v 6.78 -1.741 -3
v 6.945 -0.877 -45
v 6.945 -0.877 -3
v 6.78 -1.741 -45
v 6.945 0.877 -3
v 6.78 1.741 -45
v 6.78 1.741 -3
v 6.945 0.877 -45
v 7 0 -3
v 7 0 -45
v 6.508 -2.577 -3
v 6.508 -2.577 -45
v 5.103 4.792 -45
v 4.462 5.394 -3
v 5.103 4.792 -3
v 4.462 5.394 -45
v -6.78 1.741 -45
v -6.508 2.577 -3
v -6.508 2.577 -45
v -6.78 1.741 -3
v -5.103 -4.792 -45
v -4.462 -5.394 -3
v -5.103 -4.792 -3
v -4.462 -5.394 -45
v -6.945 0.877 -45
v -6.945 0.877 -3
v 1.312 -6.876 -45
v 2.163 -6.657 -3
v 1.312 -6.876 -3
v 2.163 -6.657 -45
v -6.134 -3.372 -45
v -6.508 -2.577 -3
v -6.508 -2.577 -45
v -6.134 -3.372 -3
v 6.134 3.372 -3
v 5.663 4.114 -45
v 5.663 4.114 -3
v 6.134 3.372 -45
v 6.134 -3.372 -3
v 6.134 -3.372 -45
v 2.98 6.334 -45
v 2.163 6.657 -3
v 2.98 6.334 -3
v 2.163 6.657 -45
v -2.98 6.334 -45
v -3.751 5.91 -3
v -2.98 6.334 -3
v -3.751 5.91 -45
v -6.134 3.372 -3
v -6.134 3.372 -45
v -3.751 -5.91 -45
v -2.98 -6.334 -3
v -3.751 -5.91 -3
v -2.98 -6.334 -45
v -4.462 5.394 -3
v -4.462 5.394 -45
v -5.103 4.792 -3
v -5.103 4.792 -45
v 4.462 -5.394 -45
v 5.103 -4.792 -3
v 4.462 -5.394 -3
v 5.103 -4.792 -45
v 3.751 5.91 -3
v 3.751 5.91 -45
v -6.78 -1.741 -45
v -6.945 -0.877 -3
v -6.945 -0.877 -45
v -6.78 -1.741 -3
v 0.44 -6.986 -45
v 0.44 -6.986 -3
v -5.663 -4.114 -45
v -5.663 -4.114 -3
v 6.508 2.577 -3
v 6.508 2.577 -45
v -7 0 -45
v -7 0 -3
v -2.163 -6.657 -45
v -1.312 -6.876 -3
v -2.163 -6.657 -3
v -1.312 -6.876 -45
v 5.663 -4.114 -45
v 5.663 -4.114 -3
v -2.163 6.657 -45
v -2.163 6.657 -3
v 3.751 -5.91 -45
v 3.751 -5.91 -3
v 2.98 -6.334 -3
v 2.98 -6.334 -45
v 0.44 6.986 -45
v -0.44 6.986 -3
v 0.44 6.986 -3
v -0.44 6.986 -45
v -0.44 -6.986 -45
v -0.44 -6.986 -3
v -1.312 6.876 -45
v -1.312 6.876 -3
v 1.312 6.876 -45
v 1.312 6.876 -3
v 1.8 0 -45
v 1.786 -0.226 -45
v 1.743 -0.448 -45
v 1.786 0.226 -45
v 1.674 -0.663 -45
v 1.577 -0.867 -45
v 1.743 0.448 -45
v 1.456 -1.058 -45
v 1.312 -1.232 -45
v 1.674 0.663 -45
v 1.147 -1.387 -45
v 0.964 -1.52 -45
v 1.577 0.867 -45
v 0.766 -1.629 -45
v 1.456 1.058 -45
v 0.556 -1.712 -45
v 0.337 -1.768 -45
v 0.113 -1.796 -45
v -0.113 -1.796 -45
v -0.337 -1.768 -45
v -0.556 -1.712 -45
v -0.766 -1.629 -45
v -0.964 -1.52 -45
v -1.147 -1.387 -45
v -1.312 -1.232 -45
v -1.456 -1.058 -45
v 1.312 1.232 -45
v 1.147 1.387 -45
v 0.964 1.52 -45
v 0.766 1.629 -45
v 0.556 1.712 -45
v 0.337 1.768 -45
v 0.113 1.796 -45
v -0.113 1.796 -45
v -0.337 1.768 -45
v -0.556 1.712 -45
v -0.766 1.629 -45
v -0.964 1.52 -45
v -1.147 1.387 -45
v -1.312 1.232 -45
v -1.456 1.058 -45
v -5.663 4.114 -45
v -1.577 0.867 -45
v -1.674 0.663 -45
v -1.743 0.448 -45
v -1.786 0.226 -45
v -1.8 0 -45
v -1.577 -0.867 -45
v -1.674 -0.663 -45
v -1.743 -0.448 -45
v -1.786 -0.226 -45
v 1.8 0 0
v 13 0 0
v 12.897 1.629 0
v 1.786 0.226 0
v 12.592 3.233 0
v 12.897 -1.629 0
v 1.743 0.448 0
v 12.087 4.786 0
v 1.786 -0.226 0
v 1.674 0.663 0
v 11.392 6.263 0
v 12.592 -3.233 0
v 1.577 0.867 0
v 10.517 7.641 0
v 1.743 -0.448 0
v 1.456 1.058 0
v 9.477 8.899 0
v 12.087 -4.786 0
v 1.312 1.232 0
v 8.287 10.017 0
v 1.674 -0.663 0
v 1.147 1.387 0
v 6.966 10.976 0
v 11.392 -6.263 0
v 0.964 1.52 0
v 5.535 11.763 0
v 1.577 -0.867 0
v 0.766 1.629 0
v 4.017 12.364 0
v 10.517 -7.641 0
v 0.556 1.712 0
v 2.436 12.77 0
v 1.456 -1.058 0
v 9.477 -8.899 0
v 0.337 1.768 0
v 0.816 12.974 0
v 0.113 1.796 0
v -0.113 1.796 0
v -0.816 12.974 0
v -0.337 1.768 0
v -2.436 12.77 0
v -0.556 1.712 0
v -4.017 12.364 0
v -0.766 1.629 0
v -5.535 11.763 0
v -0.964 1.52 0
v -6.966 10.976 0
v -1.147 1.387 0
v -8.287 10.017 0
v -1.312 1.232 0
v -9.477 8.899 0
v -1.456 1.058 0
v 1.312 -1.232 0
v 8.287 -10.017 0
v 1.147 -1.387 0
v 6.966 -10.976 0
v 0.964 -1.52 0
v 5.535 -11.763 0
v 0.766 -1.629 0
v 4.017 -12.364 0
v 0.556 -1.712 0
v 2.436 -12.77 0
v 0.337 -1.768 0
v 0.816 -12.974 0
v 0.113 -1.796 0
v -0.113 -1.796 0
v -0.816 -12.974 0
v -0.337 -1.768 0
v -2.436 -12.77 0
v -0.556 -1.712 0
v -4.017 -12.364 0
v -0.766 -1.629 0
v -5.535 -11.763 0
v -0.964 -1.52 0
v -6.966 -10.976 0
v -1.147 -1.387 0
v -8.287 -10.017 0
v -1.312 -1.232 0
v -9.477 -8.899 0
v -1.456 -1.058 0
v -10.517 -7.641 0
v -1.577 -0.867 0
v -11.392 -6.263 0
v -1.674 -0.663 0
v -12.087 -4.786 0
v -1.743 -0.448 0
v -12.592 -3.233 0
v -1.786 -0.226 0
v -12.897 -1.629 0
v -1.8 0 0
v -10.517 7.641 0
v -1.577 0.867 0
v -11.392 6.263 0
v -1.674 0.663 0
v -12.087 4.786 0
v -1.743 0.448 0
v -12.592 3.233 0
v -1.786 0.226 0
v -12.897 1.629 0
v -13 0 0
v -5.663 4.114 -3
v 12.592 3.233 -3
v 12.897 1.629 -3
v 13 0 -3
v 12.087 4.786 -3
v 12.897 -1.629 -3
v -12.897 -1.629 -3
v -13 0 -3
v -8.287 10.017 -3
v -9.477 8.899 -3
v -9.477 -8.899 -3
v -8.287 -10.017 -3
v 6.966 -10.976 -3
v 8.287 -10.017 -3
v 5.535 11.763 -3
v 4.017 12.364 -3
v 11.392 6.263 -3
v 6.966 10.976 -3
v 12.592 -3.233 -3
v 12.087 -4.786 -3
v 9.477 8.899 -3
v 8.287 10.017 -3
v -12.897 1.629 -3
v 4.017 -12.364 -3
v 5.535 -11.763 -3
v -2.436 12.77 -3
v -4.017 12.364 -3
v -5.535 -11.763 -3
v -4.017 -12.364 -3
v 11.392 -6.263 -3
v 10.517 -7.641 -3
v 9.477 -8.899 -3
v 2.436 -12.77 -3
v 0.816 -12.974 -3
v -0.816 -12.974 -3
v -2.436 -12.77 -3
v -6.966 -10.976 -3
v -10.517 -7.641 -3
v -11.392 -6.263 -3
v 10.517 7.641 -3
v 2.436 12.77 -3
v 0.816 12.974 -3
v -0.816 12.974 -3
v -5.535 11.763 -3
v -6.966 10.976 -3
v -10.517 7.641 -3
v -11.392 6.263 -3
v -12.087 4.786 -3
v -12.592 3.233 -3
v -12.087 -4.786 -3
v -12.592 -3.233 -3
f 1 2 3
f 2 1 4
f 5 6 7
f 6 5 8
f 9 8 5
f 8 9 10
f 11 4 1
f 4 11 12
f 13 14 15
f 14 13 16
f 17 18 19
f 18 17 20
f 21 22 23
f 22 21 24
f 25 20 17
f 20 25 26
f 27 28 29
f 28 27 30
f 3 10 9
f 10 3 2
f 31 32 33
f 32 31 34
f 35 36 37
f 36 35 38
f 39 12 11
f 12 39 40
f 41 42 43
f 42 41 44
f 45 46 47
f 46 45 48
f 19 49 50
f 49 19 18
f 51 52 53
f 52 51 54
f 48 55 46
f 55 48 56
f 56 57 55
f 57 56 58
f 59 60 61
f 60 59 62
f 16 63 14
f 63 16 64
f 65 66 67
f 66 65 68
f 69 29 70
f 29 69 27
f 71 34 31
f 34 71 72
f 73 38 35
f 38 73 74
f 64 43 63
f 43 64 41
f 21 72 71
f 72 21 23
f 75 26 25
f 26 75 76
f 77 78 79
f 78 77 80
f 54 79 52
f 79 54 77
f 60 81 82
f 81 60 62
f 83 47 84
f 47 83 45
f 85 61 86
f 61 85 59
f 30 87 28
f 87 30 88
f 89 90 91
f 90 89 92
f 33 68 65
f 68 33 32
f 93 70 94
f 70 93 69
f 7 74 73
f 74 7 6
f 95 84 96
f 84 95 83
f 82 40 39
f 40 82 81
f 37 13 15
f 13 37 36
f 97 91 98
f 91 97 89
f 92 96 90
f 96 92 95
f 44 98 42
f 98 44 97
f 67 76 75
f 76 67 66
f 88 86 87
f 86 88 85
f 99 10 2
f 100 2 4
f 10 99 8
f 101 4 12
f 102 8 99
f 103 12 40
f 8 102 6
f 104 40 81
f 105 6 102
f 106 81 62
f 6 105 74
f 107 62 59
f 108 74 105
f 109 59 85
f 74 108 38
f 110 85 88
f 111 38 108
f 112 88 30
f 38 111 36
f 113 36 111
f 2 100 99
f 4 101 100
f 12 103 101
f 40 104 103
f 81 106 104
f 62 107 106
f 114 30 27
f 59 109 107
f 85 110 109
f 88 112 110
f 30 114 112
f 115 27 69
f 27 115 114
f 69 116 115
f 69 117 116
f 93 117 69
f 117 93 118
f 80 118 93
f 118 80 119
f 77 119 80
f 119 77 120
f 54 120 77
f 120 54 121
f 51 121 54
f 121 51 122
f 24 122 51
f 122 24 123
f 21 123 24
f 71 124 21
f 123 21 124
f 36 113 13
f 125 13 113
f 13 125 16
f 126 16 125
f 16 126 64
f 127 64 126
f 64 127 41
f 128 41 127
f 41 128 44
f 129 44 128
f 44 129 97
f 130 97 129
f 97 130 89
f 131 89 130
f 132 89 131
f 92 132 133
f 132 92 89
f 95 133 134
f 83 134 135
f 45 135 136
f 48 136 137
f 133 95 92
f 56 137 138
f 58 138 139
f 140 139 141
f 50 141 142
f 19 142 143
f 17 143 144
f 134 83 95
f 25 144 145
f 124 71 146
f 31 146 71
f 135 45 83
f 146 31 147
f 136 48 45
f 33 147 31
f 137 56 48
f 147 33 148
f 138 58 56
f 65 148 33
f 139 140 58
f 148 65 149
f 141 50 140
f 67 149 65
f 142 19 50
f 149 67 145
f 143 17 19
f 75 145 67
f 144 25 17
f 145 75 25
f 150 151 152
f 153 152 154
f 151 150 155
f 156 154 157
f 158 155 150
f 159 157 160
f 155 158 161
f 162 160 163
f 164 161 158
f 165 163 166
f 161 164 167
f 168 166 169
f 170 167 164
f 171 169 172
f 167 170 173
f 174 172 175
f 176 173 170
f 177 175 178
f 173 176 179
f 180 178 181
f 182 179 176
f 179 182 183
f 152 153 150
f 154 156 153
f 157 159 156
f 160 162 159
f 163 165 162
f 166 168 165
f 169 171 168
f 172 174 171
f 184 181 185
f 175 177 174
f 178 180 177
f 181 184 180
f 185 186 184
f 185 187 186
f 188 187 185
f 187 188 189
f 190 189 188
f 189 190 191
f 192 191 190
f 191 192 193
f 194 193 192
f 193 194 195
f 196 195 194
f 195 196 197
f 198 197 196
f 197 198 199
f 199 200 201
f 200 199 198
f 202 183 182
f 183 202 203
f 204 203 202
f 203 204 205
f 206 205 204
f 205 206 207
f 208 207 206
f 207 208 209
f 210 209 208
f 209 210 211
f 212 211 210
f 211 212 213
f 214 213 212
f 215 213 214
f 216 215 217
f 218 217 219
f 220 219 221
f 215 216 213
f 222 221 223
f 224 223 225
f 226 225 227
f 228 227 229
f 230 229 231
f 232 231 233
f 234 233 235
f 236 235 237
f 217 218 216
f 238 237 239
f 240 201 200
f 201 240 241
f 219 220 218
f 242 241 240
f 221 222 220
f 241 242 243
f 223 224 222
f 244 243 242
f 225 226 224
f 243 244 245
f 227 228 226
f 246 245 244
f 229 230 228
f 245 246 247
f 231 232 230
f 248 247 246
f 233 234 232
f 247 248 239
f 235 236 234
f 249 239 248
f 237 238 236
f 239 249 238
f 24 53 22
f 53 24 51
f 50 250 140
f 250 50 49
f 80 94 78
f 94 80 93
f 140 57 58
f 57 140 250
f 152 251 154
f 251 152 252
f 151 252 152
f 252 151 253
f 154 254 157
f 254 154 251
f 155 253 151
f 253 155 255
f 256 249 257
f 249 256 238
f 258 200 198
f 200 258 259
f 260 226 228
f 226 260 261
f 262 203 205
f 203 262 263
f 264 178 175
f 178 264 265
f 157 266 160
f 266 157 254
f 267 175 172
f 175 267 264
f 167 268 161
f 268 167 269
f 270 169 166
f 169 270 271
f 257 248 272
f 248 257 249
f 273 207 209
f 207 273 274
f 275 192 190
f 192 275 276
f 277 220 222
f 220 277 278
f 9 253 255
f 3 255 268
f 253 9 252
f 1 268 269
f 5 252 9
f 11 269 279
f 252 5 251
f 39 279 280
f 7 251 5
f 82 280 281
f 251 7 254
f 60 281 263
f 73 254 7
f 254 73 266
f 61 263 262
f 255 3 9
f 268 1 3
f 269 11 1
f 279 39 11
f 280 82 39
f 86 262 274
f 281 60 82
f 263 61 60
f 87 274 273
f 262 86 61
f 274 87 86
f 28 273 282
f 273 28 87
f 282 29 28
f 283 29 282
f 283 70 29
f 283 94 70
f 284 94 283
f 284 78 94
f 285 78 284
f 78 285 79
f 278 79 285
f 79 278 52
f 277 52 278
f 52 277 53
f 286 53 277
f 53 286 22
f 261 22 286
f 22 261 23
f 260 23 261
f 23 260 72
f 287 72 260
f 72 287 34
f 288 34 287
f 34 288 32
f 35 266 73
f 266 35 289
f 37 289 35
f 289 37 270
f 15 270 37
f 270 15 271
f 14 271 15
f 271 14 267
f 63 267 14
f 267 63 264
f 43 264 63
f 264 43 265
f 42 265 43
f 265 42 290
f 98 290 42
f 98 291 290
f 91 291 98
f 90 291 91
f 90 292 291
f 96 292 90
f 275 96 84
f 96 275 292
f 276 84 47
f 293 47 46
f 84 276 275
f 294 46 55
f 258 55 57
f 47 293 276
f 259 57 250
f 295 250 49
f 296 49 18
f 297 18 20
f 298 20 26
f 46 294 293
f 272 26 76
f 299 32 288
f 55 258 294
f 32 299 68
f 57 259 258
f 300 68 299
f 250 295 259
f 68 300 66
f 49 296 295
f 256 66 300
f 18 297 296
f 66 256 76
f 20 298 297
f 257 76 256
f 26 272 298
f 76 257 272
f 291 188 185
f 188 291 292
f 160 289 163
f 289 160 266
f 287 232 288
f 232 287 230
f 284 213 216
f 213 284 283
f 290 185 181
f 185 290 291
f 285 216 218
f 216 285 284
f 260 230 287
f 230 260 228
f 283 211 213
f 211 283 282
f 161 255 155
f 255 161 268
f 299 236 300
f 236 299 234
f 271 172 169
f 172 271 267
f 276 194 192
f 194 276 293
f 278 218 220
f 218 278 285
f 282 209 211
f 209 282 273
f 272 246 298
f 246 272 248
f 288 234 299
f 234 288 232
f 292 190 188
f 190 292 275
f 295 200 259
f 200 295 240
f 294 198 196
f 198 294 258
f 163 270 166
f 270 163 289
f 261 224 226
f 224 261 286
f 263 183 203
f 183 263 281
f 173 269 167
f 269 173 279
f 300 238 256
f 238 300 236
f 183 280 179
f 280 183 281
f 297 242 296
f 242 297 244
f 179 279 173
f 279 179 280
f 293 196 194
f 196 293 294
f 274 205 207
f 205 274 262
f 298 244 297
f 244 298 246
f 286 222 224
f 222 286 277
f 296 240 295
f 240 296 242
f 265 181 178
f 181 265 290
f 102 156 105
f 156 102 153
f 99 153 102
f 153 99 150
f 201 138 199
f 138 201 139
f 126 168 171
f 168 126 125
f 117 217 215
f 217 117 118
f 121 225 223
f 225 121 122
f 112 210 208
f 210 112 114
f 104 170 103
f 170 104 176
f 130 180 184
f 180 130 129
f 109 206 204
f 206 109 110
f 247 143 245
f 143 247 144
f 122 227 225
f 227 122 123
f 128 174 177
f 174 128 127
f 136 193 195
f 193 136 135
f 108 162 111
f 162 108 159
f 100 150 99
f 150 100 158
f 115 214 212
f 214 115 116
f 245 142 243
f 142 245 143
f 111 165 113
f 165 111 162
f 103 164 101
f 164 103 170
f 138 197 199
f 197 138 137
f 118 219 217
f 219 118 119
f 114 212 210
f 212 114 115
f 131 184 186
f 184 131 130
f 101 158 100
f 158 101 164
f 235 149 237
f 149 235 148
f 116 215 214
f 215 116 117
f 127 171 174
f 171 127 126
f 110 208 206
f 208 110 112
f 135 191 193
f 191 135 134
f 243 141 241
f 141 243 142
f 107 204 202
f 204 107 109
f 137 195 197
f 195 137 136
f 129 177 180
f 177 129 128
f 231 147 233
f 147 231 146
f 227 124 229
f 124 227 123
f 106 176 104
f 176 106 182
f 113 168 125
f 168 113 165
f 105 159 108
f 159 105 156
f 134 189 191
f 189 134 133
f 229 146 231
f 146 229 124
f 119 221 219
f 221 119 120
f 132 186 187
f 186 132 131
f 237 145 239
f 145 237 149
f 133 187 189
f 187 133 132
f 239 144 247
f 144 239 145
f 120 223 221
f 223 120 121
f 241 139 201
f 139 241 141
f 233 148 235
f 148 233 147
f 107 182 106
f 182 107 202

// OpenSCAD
$fn = 50;


difference() {
	union() {
		translate(v = [0, 0, -45.0000000000]) {
			cylinder(h = 45, r = 7.0000000000);
		}
		translate(v = [0, 0, -3.0000000000]) {
			cylinder(h = 3, r = 13.0000000000);
		}
	}
	union() {
		#translate(v = [0, 0, -45]) {
			cylinder(h = 45, r = 1.8000000000);
		}
	}
}
